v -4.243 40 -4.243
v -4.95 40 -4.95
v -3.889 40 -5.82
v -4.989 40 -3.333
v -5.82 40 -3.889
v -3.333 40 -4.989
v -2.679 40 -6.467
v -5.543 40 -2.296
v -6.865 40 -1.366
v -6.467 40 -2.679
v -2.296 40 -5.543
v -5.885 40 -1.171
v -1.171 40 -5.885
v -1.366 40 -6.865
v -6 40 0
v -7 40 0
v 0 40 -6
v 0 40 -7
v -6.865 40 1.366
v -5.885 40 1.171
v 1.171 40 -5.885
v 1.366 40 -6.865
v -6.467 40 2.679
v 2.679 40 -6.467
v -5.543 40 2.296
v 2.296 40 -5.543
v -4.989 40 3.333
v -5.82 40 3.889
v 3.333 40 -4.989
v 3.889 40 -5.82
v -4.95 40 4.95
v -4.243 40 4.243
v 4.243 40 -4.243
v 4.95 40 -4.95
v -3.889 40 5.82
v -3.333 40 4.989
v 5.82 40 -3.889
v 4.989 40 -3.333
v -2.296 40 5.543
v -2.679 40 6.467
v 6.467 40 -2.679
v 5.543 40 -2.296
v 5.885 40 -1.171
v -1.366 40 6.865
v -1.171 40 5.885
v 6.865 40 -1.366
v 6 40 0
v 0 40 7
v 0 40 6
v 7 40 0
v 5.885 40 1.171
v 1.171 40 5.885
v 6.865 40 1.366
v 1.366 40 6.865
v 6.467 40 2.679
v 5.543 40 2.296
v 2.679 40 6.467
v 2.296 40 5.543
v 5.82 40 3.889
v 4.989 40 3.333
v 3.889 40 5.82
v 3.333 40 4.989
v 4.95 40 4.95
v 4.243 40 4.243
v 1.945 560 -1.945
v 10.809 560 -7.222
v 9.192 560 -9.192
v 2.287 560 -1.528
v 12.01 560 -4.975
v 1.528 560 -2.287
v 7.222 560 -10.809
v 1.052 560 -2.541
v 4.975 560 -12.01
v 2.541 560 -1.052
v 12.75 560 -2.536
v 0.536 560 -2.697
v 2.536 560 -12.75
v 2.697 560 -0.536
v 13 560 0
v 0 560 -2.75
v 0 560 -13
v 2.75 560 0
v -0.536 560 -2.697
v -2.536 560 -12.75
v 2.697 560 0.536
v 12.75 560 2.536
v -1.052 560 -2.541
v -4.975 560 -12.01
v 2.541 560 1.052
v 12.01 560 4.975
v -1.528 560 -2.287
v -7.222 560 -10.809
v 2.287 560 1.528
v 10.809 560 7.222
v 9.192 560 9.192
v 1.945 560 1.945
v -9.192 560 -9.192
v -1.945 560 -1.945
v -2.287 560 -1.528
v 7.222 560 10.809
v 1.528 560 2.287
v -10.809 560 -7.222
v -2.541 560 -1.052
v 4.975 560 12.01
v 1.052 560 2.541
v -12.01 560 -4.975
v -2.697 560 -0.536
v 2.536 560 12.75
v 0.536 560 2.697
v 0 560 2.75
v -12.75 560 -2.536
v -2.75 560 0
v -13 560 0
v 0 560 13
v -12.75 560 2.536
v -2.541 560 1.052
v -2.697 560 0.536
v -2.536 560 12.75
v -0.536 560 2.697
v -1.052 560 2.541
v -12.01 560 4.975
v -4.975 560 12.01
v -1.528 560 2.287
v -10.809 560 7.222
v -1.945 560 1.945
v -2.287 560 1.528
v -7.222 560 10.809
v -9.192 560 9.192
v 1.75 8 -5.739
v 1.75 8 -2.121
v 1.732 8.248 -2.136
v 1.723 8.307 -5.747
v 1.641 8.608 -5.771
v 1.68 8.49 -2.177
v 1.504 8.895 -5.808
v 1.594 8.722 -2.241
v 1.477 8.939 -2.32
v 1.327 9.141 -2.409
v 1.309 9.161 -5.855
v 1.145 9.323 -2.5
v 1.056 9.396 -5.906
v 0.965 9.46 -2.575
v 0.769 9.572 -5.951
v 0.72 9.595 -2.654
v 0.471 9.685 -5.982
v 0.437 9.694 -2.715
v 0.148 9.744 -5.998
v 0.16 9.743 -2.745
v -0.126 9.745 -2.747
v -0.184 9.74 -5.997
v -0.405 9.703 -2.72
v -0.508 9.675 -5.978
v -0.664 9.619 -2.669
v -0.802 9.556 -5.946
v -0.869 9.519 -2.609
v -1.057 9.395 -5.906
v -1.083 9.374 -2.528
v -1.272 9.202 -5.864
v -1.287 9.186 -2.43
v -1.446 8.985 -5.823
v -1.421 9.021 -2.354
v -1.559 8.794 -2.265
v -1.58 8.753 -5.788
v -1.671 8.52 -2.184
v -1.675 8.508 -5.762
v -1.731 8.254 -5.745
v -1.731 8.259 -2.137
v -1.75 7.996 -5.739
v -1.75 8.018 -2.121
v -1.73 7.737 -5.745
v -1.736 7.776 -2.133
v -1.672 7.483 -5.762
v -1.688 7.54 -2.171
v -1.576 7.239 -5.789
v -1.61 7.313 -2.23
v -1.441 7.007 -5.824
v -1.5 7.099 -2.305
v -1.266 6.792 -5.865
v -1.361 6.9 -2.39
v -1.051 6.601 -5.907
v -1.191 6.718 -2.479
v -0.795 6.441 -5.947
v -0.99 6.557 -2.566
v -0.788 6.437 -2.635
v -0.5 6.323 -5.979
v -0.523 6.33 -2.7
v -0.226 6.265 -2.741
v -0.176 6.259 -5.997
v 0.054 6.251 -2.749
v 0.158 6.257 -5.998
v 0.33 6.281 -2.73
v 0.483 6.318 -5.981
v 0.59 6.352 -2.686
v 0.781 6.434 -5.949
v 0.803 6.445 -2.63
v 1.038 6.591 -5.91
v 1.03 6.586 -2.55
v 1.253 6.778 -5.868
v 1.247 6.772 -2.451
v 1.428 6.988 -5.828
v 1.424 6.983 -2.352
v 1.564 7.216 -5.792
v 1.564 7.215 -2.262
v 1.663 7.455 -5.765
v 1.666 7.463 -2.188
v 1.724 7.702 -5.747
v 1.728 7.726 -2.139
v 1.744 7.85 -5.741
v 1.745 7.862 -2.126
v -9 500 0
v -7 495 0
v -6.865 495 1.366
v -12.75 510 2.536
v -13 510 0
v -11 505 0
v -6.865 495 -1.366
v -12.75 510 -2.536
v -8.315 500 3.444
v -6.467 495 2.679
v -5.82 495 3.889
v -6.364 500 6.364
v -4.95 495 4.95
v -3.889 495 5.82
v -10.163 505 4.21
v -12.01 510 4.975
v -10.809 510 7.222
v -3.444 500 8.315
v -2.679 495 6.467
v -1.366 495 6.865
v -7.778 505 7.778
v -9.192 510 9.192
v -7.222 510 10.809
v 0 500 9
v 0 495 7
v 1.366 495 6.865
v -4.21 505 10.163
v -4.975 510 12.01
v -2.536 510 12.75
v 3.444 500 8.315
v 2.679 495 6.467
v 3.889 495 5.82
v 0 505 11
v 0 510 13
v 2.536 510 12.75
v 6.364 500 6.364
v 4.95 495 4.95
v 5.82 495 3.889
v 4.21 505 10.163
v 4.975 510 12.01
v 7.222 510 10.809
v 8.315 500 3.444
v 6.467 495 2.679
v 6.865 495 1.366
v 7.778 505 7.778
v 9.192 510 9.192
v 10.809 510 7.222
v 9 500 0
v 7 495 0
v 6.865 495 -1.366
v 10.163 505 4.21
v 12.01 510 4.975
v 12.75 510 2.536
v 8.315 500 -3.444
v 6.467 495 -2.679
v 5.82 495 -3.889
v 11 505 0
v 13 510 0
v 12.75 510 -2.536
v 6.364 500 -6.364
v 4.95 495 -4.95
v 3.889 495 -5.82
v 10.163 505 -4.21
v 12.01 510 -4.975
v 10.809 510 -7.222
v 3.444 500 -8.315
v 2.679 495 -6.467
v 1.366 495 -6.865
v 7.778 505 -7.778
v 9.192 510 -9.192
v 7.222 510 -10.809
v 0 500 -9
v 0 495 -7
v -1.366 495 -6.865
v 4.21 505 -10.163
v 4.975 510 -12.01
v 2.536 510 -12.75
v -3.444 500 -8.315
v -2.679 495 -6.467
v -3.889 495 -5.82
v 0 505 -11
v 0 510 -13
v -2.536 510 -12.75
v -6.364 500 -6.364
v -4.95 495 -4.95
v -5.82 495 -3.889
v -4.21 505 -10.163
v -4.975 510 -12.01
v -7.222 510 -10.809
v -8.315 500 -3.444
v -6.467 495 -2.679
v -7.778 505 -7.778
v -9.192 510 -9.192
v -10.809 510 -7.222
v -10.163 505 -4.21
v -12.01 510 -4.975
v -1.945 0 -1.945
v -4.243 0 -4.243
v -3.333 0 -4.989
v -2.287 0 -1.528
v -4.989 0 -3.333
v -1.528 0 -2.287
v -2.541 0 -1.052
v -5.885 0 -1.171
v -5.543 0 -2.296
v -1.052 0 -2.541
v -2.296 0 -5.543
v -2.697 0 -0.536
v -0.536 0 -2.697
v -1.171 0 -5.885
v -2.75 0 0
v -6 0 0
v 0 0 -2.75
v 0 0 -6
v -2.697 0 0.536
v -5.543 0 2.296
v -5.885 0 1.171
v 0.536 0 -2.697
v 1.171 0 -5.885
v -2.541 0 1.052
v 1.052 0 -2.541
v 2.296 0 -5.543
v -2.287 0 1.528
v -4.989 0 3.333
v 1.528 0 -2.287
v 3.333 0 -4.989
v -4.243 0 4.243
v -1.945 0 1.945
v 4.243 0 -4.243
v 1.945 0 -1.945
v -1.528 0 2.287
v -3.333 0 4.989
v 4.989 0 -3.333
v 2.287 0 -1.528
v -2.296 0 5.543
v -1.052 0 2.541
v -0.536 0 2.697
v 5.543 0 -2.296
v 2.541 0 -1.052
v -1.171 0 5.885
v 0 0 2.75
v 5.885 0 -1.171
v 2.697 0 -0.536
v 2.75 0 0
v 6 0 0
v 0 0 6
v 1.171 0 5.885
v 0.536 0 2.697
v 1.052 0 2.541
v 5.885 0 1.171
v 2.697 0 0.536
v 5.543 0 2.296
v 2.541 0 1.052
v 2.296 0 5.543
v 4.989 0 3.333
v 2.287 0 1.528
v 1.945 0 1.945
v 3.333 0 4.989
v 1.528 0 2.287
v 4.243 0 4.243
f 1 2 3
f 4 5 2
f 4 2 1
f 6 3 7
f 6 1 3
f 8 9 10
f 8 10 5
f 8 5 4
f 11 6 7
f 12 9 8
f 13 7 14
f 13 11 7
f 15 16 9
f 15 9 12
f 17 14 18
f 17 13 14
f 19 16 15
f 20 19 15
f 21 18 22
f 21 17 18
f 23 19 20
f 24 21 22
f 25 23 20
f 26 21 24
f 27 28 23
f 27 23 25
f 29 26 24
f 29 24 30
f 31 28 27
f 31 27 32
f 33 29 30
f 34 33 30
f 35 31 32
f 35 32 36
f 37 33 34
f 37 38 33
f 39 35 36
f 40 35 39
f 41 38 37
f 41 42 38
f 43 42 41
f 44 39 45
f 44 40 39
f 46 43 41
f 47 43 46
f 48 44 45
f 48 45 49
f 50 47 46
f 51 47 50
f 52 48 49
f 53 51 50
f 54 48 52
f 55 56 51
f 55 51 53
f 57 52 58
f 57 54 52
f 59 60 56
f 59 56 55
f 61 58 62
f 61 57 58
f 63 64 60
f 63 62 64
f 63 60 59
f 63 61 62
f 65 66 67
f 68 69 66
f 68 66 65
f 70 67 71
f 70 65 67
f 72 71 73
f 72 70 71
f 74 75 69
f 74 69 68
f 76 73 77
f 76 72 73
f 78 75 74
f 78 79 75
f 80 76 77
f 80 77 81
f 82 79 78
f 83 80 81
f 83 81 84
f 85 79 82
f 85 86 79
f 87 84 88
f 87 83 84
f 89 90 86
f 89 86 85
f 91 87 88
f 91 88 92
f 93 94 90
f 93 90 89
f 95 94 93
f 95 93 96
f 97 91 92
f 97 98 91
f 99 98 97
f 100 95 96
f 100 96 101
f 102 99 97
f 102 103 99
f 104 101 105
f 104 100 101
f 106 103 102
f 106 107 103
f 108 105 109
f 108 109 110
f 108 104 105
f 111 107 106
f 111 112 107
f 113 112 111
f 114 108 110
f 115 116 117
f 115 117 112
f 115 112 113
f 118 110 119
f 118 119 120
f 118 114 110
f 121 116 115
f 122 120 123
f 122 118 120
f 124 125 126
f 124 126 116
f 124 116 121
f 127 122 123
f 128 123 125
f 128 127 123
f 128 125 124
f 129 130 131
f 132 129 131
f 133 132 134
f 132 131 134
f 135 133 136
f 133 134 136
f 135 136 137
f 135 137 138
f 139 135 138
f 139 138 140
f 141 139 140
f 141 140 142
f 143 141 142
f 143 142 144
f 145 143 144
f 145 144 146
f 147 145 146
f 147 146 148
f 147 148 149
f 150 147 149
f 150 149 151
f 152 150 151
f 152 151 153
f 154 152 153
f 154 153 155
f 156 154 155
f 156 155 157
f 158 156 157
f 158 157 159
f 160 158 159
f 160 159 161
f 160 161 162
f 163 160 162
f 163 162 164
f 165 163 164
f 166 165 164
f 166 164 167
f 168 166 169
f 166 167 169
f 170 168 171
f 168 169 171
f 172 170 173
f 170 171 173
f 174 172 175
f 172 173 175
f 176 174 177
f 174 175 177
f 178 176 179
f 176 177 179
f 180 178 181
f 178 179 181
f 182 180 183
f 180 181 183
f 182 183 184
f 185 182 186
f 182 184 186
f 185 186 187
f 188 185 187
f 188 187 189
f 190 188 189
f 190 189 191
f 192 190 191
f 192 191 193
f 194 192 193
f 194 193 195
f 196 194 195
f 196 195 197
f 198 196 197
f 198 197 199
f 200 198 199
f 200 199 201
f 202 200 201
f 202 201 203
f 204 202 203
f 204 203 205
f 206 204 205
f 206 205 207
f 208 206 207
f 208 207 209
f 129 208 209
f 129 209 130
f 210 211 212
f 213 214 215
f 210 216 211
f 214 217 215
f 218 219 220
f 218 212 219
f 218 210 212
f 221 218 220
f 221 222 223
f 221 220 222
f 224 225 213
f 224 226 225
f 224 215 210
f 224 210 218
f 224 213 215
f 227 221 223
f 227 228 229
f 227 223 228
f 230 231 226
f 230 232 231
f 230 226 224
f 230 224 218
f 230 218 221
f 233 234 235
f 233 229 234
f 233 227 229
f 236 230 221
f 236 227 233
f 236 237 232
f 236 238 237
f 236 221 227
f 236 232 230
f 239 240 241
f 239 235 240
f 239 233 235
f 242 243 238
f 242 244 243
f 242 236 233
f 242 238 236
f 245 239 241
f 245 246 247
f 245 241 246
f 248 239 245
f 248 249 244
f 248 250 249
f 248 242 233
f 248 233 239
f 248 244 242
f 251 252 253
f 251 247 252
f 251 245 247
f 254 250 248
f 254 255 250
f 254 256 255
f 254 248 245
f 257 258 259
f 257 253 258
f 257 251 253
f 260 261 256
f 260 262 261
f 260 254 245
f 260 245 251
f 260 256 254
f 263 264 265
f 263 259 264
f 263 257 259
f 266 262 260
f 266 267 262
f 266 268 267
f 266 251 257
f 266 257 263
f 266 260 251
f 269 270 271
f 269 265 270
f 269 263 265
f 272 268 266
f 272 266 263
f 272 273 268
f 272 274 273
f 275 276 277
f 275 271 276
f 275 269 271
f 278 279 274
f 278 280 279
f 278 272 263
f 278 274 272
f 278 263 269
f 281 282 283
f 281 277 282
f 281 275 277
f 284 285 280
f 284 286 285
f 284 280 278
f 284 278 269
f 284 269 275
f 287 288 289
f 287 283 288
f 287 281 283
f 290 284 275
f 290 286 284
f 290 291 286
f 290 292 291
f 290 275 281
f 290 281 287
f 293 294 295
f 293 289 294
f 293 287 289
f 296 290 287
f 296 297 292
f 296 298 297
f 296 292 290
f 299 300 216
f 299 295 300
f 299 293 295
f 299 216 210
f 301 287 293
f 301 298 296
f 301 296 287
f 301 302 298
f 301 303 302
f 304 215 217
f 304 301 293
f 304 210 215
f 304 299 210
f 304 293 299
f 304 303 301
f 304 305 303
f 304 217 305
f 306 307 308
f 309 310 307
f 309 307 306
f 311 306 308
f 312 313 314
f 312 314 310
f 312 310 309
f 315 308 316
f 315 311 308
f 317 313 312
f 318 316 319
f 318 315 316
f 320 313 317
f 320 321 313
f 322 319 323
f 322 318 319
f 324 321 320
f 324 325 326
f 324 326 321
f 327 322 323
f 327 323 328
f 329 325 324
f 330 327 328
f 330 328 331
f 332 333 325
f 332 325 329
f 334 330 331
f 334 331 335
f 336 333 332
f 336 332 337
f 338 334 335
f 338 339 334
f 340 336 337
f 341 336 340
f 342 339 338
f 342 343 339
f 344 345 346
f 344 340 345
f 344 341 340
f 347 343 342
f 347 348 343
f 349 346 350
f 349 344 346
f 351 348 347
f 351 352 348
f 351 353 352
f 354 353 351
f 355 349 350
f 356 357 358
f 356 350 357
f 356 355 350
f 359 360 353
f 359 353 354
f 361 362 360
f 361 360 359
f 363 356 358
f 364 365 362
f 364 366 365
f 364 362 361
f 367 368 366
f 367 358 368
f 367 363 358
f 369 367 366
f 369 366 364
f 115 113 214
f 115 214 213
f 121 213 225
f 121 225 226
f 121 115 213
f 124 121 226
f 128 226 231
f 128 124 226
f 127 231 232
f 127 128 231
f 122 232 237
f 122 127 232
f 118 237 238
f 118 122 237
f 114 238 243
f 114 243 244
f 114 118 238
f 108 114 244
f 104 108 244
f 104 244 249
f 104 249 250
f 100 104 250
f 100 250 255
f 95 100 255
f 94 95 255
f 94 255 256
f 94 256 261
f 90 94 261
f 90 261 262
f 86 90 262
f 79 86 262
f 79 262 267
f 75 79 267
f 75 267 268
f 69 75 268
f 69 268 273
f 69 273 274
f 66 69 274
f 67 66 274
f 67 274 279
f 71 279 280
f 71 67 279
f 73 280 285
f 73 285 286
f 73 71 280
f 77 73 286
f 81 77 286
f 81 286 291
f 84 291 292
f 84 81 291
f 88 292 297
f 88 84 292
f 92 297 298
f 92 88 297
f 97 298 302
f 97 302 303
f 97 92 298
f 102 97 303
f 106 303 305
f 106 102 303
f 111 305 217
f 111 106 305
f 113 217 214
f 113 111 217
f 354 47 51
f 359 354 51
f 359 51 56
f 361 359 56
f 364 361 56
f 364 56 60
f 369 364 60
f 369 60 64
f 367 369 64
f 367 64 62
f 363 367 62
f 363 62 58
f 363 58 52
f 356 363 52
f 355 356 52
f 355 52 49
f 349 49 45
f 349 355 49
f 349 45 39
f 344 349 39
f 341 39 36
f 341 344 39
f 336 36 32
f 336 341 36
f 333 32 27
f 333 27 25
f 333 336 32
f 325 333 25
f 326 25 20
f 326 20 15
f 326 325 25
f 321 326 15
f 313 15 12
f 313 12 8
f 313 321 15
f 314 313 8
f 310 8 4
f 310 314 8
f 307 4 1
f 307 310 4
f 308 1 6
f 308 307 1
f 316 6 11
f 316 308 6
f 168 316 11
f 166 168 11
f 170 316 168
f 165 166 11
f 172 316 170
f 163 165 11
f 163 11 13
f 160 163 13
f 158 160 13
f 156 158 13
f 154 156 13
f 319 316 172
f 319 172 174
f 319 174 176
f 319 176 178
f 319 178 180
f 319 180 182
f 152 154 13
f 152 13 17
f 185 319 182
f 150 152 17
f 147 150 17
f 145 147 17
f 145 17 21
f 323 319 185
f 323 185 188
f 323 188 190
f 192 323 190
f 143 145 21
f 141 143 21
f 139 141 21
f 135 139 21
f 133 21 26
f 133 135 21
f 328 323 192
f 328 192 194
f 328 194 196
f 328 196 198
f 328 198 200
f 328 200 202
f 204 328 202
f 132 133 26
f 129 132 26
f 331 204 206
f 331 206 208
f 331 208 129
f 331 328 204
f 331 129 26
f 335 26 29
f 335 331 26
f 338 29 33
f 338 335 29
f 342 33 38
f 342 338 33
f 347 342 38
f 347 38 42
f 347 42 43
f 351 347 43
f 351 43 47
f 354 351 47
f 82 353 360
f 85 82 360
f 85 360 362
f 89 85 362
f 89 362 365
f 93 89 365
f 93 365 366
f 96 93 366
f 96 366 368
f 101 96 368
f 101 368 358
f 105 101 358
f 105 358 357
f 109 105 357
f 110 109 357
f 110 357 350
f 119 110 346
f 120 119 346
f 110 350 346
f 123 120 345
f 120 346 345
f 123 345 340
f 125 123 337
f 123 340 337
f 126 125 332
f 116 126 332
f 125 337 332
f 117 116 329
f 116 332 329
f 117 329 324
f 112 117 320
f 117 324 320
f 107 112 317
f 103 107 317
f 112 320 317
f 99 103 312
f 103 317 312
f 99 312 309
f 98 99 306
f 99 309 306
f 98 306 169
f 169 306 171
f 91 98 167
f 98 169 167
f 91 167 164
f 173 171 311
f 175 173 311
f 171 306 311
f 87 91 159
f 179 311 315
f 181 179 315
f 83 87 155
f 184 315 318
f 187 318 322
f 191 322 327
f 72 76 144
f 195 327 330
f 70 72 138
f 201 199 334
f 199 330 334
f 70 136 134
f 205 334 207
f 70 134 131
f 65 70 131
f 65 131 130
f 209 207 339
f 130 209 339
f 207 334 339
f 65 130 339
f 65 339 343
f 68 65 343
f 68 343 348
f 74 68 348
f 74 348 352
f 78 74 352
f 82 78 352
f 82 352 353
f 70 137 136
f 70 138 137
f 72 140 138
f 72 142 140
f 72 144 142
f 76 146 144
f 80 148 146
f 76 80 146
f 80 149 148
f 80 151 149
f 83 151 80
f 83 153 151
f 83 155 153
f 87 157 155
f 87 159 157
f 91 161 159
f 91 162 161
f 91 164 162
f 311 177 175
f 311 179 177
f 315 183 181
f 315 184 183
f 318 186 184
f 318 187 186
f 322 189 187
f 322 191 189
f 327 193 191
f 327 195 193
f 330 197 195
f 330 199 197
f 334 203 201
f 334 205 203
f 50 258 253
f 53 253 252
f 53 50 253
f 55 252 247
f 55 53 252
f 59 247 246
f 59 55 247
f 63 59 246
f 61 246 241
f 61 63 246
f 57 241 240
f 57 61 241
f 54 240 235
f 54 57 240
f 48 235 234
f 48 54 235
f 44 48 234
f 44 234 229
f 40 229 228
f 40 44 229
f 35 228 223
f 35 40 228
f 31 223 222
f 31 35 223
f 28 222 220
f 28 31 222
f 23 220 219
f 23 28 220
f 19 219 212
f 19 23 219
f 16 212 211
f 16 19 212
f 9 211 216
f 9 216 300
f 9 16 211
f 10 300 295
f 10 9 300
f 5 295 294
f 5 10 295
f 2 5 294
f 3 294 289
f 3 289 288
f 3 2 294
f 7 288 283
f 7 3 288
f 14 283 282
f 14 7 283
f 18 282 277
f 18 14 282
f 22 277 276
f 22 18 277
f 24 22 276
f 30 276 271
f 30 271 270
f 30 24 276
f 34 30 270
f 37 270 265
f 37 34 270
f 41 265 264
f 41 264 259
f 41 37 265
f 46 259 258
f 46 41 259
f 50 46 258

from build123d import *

# Parameters (mm, degrees)
F0_R         = 7
F1_DEPTH     = 560
F2_R         = 7
F2_R_2       = 6
F3_DEPTH     = 40
F4_R         = 2.75
F5_DEPTH     = 560.001
F6_R         = 1.75
F7_DEPTH     = 10
F8_R         = 13
F8_R_2       = 7
F9_DEPTH     = 70
F10_S5_R     = 7
F10_T6_DEPTH = 22


# Not quite as in the source:
# - a fillet or chamfer that OpenCascade refuses, or shapes differently, is made with other operations: its cross-section is extruded or revolved along the edge and cut away or added


with BuildPart() as f1:
    # F0 (on Front) → F1 (new body)
    with BuildSketch(Plane.XZ):
        Circle(F0_R)
    extrude(amount=-F1_DEPTH)

    # F2 (on face) → F3 (cut)
    with BuildSketch(Plane.XZ):
        Circle(F2_R)
        Circle(F2_R_2, mode=Mode.SUBTRACT)
    extrude(amount=-F3_DEPTH, mode=Mode.SUBTRACT)

    # F4 (on face) → F5 (cut, through all)
    with BuildSketch(Plane.XZ):
        Circle(F4_R)
    extrude(amount=-F5_DEPTH, mode=Mode.SUBTRACT)

    # F6 (on Top) → F7 (cut)
    with BuildSketch(Plane.XY):
        with Locations((0, 8)):
            Circle(F6_R)
    extrude(amount=-F7_DEPTH, mode=Mode.SUBTRACT)

    # F8 (on face) → F9 (join)
    with BuildSketch(Plane(origin=(0, 560, 0), x_dir=(-1, 0, 0), z_dir=(0, 1, 0))):
        Circle(F8_R)
        Circle(F8_R_2, mode=Mode.SUBTRACT)
    extrude(amount=-F9_DEPTH)

    # F10: chamfer of 20 x 8 on 1 edges, made by hand


with BuildPart() as f10_tool2:
    # F10_s3 → F10_t4 (revolve)
    with BuildSketch(Plane.XY):
        Polygon((-5, 490), (-13, 510), (-13, 490), align=None)
    revolve(axis=Axis((0, 490, 0), (0, 1, 0)))

    # F10_s5 → F10_t6 (cut, symmetric)
    with BuildSketch(Plane.XZ.offset(-500)):
        Circle(F10_S5_R)
    extrude(amount=F10_T6_DEPTH, both=True, mode=Mode.SUBTRACT)


with BuildPart() as f1_1:
    add(f1.part)

    # F10_t1: cut F10_tool2
    add(f10_tool2.part, mode=Mode.SUBTRACT)


solid = f1_1.part
